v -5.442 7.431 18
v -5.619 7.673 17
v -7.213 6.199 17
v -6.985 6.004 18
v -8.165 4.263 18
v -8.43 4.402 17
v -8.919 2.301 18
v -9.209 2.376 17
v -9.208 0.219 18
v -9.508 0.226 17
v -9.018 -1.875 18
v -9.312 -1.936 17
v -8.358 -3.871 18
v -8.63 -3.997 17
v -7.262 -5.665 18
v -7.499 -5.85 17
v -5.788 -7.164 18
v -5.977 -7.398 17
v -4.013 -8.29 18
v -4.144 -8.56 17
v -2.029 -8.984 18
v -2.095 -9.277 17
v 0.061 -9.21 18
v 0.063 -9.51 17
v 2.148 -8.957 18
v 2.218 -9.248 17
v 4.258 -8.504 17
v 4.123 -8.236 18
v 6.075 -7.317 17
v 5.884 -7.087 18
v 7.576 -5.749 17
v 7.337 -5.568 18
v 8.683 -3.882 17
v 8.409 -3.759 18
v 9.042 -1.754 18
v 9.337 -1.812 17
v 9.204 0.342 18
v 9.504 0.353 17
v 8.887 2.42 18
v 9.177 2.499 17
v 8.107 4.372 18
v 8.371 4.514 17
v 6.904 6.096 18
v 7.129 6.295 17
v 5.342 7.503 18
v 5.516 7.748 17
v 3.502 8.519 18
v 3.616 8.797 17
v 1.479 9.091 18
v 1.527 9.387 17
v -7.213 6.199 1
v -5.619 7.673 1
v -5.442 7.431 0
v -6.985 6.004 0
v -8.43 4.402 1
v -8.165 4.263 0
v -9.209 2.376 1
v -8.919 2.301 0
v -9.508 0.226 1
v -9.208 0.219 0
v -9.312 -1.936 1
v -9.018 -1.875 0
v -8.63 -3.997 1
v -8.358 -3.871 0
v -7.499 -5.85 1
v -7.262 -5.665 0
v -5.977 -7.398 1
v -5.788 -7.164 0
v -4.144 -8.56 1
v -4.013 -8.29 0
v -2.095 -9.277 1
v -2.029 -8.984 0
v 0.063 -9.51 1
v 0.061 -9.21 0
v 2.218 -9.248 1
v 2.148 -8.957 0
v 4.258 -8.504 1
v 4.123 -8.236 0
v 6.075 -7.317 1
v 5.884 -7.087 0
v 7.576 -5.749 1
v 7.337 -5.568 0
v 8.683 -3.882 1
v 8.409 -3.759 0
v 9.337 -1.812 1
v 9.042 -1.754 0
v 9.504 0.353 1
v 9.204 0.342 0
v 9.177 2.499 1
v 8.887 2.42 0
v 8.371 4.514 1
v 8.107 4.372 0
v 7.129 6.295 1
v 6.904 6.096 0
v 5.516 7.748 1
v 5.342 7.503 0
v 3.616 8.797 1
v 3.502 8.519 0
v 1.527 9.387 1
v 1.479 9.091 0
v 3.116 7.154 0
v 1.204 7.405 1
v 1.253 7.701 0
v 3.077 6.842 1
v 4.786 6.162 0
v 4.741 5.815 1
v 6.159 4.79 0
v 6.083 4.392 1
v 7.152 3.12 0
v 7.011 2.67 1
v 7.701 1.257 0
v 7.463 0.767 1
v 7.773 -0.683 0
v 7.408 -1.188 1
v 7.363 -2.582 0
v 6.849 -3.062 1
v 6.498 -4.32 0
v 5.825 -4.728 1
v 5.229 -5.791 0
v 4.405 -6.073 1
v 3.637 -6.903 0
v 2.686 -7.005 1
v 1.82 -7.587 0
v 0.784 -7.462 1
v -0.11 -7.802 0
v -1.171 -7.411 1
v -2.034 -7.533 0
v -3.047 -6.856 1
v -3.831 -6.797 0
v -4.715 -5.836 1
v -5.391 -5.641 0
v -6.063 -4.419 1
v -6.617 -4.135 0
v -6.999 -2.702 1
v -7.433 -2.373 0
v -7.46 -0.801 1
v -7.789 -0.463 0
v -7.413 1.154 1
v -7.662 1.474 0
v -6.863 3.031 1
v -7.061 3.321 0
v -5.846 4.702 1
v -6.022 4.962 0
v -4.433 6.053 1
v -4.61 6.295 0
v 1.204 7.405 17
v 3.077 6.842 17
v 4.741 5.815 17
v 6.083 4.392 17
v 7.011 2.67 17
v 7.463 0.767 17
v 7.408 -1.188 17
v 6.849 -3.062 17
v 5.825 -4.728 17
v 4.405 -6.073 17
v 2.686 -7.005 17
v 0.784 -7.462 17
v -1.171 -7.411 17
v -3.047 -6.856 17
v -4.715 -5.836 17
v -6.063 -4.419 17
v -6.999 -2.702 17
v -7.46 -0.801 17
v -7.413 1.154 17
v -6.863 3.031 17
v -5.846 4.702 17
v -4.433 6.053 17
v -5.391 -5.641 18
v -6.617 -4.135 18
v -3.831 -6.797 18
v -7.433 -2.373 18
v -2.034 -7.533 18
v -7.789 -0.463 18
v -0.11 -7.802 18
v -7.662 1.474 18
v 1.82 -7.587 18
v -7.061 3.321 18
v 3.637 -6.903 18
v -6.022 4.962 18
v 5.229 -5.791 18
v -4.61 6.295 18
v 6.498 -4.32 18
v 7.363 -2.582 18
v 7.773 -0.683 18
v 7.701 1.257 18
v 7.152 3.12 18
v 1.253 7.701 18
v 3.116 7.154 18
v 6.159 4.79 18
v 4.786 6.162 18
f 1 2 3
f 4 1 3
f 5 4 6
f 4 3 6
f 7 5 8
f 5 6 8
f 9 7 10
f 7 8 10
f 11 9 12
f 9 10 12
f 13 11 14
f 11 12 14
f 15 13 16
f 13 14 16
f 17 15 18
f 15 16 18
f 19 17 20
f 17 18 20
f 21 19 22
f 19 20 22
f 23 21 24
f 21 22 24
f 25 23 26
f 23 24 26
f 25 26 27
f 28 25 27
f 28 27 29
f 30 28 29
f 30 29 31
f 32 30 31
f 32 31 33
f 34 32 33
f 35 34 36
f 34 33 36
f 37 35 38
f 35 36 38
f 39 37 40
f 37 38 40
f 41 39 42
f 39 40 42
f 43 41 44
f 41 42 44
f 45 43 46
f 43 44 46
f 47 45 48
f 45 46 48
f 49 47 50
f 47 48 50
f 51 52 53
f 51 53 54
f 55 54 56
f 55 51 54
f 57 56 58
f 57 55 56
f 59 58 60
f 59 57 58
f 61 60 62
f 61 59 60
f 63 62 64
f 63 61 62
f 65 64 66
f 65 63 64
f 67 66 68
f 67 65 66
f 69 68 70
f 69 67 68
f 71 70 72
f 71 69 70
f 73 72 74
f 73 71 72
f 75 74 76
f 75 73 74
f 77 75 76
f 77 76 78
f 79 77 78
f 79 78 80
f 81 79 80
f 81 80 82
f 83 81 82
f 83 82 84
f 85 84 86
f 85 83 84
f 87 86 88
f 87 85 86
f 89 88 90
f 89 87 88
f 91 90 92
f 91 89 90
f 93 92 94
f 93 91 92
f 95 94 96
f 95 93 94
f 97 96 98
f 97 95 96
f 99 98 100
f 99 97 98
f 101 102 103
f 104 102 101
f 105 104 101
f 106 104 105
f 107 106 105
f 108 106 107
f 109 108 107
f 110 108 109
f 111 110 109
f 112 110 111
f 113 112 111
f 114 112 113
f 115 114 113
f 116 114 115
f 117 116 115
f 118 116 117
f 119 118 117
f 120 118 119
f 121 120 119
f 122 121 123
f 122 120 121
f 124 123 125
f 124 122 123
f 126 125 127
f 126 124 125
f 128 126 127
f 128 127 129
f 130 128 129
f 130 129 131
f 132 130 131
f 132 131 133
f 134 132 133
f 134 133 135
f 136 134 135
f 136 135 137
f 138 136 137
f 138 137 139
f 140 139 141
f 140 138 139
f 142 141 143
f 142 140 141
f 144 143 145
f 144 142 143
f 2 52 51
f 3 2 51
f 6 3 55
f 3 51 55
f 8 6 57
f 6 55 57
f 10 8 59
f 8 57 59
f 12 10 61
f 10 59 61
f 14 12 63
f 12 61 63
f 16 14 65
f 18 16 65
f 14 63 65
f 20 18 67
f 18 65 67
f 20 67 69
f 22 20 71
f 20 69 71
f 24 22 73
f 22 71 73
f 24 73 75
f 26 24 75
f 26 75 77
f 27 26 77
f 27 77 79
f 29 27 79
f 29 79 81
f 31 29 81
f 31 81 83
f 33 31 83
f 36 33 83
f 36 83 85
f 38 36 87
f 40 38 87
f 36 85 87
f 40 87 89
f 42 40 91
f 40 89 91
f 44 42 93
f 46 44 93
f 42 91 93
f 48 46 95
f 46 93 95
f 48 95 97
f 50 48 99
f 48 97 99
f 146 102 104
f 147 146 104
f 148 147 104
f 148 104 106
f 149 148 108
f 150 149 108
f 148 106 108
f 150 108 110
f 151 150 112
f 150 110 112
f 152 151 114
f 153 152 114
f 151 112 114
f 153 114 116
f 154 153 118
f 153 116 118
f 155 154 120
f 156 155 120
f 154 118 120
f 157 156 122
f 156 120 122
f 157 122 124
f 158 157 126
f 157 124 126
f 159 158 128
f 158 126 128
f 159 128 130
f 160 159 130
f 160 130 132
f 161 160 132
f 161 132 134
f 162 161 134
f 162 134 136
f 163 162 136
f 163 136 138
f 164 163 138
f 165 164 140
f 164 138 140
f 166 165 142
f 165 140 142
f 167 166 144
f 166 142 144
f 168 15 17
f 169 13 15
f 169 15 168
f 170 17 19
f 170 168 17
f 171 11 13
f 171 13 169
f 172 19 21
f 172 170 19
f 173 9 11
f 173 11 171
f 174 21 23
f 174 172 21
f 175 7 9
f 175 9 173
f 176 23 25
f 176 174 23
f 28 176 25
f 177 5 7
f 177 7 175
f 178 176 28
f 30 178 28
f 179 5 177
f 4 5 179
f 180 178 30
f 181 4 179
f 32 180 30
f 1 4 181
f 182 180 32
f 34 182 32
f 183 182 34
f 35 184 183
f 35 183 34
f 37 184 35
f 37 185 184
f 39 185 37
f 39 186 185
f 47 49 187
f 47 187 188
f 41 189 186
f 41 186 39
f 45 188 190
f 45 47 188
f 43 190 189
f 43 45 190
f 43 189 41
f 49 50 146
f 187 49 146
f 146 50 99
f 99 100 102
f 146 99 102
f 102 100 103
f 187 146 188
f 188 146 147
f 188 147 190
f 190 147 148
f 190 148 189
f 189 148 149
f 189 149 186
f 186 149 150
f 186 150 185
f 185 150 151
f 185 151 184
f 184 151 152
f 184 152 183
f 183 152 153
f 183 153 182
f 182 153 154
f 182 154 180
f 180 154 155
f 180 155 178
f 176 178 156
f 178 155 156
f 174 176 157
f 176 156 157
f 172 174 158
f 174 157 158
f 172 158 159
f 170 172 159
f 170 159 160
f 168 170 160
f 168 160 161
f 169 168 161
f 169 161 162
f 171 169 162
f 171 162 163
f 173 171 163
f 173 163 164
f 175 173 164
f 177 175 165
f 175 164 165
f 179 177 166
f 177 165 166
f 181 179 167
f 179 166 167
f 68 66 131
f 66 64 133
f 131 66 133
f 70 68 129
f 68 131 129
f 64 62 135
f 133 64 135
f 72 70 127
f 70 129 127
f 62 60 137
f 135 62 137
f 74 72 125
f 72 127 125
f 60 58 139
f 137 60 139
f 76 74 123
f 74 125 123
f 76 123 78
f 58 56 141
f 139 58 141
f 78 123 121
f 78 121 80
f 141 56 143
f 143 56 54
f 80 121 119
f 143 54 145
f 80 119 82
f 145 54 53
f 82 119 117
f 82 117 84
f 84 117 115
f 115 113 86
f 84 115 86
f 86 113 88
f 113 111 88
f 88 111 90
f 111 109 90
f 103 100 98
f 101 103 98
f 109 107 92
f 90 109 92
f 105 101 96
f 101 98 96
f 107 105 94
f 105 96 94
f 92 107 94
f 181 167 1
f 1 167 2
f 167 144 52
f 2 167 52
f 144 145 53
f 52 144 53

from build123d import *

# Parameters (mm, degrees)
F1_DEPTH   = 18
F2_SIZE2   = 1
F2_SIZE    = 0.3
F2_2_SIZE2 = 1
F2_2_SIZE  = 0.3


# Not quite as in the source:
# - a feature names something its author has since deleted; it is built from what else it names


with BuildPart() as f1:
    # F0 (on Top) → F1 (new body)
    with BuildSketch(Plane.XY):
        with BuildLine():
            ThreePointArc((1.2044566856, 7.40527886), (1.7499452086, -7.2956536834), (-4.4326164701, 6.0531629856))
            Line((-4.4326164701, 6.0531629856), (-5.6190034408, 7.6732881976))
            ThreePointArc((-5.6190034408, 7.6732881976), (2.2183169274, -9.2483307381), (1.5268287492, 9.3872970232))
            Line((1.5268287492, 9.3872970232), (1.2044566856, 7.40527886))
        make_face()
    extrude(amount=F1_DEPTH)

    # F2
    f2_edges = [f1.edges().sort_by_distance(p)[0] for p in [
        (2.218317, -9.248331, 18),
        (1.749945, -7.295654, 18),
    ]]
    f2_side = f1.faces().sort_by_distance((1.630296, 8.353243, 18))[0]
    chamfer(f2_edges, length=F2_SIZE, length2=F2_SIZE2, reference=f2_side)

    # F2#2
    f2_2_edges = [f1.edges().sort_by_distance(p)[0] for p in [
        (2.218317, -9.248331, 0),
        (1.749945, -7.295654, 0),
    ]]
    f2_2_side = f1.faces().sort_by_distance((1.630296, 8.353243, 0))[0]
    chamfer(f2_2_edges, length=F2_2_SIZE, length2=F2_2_SIZE2, reference=f2_2_side)


solid = f1.part
